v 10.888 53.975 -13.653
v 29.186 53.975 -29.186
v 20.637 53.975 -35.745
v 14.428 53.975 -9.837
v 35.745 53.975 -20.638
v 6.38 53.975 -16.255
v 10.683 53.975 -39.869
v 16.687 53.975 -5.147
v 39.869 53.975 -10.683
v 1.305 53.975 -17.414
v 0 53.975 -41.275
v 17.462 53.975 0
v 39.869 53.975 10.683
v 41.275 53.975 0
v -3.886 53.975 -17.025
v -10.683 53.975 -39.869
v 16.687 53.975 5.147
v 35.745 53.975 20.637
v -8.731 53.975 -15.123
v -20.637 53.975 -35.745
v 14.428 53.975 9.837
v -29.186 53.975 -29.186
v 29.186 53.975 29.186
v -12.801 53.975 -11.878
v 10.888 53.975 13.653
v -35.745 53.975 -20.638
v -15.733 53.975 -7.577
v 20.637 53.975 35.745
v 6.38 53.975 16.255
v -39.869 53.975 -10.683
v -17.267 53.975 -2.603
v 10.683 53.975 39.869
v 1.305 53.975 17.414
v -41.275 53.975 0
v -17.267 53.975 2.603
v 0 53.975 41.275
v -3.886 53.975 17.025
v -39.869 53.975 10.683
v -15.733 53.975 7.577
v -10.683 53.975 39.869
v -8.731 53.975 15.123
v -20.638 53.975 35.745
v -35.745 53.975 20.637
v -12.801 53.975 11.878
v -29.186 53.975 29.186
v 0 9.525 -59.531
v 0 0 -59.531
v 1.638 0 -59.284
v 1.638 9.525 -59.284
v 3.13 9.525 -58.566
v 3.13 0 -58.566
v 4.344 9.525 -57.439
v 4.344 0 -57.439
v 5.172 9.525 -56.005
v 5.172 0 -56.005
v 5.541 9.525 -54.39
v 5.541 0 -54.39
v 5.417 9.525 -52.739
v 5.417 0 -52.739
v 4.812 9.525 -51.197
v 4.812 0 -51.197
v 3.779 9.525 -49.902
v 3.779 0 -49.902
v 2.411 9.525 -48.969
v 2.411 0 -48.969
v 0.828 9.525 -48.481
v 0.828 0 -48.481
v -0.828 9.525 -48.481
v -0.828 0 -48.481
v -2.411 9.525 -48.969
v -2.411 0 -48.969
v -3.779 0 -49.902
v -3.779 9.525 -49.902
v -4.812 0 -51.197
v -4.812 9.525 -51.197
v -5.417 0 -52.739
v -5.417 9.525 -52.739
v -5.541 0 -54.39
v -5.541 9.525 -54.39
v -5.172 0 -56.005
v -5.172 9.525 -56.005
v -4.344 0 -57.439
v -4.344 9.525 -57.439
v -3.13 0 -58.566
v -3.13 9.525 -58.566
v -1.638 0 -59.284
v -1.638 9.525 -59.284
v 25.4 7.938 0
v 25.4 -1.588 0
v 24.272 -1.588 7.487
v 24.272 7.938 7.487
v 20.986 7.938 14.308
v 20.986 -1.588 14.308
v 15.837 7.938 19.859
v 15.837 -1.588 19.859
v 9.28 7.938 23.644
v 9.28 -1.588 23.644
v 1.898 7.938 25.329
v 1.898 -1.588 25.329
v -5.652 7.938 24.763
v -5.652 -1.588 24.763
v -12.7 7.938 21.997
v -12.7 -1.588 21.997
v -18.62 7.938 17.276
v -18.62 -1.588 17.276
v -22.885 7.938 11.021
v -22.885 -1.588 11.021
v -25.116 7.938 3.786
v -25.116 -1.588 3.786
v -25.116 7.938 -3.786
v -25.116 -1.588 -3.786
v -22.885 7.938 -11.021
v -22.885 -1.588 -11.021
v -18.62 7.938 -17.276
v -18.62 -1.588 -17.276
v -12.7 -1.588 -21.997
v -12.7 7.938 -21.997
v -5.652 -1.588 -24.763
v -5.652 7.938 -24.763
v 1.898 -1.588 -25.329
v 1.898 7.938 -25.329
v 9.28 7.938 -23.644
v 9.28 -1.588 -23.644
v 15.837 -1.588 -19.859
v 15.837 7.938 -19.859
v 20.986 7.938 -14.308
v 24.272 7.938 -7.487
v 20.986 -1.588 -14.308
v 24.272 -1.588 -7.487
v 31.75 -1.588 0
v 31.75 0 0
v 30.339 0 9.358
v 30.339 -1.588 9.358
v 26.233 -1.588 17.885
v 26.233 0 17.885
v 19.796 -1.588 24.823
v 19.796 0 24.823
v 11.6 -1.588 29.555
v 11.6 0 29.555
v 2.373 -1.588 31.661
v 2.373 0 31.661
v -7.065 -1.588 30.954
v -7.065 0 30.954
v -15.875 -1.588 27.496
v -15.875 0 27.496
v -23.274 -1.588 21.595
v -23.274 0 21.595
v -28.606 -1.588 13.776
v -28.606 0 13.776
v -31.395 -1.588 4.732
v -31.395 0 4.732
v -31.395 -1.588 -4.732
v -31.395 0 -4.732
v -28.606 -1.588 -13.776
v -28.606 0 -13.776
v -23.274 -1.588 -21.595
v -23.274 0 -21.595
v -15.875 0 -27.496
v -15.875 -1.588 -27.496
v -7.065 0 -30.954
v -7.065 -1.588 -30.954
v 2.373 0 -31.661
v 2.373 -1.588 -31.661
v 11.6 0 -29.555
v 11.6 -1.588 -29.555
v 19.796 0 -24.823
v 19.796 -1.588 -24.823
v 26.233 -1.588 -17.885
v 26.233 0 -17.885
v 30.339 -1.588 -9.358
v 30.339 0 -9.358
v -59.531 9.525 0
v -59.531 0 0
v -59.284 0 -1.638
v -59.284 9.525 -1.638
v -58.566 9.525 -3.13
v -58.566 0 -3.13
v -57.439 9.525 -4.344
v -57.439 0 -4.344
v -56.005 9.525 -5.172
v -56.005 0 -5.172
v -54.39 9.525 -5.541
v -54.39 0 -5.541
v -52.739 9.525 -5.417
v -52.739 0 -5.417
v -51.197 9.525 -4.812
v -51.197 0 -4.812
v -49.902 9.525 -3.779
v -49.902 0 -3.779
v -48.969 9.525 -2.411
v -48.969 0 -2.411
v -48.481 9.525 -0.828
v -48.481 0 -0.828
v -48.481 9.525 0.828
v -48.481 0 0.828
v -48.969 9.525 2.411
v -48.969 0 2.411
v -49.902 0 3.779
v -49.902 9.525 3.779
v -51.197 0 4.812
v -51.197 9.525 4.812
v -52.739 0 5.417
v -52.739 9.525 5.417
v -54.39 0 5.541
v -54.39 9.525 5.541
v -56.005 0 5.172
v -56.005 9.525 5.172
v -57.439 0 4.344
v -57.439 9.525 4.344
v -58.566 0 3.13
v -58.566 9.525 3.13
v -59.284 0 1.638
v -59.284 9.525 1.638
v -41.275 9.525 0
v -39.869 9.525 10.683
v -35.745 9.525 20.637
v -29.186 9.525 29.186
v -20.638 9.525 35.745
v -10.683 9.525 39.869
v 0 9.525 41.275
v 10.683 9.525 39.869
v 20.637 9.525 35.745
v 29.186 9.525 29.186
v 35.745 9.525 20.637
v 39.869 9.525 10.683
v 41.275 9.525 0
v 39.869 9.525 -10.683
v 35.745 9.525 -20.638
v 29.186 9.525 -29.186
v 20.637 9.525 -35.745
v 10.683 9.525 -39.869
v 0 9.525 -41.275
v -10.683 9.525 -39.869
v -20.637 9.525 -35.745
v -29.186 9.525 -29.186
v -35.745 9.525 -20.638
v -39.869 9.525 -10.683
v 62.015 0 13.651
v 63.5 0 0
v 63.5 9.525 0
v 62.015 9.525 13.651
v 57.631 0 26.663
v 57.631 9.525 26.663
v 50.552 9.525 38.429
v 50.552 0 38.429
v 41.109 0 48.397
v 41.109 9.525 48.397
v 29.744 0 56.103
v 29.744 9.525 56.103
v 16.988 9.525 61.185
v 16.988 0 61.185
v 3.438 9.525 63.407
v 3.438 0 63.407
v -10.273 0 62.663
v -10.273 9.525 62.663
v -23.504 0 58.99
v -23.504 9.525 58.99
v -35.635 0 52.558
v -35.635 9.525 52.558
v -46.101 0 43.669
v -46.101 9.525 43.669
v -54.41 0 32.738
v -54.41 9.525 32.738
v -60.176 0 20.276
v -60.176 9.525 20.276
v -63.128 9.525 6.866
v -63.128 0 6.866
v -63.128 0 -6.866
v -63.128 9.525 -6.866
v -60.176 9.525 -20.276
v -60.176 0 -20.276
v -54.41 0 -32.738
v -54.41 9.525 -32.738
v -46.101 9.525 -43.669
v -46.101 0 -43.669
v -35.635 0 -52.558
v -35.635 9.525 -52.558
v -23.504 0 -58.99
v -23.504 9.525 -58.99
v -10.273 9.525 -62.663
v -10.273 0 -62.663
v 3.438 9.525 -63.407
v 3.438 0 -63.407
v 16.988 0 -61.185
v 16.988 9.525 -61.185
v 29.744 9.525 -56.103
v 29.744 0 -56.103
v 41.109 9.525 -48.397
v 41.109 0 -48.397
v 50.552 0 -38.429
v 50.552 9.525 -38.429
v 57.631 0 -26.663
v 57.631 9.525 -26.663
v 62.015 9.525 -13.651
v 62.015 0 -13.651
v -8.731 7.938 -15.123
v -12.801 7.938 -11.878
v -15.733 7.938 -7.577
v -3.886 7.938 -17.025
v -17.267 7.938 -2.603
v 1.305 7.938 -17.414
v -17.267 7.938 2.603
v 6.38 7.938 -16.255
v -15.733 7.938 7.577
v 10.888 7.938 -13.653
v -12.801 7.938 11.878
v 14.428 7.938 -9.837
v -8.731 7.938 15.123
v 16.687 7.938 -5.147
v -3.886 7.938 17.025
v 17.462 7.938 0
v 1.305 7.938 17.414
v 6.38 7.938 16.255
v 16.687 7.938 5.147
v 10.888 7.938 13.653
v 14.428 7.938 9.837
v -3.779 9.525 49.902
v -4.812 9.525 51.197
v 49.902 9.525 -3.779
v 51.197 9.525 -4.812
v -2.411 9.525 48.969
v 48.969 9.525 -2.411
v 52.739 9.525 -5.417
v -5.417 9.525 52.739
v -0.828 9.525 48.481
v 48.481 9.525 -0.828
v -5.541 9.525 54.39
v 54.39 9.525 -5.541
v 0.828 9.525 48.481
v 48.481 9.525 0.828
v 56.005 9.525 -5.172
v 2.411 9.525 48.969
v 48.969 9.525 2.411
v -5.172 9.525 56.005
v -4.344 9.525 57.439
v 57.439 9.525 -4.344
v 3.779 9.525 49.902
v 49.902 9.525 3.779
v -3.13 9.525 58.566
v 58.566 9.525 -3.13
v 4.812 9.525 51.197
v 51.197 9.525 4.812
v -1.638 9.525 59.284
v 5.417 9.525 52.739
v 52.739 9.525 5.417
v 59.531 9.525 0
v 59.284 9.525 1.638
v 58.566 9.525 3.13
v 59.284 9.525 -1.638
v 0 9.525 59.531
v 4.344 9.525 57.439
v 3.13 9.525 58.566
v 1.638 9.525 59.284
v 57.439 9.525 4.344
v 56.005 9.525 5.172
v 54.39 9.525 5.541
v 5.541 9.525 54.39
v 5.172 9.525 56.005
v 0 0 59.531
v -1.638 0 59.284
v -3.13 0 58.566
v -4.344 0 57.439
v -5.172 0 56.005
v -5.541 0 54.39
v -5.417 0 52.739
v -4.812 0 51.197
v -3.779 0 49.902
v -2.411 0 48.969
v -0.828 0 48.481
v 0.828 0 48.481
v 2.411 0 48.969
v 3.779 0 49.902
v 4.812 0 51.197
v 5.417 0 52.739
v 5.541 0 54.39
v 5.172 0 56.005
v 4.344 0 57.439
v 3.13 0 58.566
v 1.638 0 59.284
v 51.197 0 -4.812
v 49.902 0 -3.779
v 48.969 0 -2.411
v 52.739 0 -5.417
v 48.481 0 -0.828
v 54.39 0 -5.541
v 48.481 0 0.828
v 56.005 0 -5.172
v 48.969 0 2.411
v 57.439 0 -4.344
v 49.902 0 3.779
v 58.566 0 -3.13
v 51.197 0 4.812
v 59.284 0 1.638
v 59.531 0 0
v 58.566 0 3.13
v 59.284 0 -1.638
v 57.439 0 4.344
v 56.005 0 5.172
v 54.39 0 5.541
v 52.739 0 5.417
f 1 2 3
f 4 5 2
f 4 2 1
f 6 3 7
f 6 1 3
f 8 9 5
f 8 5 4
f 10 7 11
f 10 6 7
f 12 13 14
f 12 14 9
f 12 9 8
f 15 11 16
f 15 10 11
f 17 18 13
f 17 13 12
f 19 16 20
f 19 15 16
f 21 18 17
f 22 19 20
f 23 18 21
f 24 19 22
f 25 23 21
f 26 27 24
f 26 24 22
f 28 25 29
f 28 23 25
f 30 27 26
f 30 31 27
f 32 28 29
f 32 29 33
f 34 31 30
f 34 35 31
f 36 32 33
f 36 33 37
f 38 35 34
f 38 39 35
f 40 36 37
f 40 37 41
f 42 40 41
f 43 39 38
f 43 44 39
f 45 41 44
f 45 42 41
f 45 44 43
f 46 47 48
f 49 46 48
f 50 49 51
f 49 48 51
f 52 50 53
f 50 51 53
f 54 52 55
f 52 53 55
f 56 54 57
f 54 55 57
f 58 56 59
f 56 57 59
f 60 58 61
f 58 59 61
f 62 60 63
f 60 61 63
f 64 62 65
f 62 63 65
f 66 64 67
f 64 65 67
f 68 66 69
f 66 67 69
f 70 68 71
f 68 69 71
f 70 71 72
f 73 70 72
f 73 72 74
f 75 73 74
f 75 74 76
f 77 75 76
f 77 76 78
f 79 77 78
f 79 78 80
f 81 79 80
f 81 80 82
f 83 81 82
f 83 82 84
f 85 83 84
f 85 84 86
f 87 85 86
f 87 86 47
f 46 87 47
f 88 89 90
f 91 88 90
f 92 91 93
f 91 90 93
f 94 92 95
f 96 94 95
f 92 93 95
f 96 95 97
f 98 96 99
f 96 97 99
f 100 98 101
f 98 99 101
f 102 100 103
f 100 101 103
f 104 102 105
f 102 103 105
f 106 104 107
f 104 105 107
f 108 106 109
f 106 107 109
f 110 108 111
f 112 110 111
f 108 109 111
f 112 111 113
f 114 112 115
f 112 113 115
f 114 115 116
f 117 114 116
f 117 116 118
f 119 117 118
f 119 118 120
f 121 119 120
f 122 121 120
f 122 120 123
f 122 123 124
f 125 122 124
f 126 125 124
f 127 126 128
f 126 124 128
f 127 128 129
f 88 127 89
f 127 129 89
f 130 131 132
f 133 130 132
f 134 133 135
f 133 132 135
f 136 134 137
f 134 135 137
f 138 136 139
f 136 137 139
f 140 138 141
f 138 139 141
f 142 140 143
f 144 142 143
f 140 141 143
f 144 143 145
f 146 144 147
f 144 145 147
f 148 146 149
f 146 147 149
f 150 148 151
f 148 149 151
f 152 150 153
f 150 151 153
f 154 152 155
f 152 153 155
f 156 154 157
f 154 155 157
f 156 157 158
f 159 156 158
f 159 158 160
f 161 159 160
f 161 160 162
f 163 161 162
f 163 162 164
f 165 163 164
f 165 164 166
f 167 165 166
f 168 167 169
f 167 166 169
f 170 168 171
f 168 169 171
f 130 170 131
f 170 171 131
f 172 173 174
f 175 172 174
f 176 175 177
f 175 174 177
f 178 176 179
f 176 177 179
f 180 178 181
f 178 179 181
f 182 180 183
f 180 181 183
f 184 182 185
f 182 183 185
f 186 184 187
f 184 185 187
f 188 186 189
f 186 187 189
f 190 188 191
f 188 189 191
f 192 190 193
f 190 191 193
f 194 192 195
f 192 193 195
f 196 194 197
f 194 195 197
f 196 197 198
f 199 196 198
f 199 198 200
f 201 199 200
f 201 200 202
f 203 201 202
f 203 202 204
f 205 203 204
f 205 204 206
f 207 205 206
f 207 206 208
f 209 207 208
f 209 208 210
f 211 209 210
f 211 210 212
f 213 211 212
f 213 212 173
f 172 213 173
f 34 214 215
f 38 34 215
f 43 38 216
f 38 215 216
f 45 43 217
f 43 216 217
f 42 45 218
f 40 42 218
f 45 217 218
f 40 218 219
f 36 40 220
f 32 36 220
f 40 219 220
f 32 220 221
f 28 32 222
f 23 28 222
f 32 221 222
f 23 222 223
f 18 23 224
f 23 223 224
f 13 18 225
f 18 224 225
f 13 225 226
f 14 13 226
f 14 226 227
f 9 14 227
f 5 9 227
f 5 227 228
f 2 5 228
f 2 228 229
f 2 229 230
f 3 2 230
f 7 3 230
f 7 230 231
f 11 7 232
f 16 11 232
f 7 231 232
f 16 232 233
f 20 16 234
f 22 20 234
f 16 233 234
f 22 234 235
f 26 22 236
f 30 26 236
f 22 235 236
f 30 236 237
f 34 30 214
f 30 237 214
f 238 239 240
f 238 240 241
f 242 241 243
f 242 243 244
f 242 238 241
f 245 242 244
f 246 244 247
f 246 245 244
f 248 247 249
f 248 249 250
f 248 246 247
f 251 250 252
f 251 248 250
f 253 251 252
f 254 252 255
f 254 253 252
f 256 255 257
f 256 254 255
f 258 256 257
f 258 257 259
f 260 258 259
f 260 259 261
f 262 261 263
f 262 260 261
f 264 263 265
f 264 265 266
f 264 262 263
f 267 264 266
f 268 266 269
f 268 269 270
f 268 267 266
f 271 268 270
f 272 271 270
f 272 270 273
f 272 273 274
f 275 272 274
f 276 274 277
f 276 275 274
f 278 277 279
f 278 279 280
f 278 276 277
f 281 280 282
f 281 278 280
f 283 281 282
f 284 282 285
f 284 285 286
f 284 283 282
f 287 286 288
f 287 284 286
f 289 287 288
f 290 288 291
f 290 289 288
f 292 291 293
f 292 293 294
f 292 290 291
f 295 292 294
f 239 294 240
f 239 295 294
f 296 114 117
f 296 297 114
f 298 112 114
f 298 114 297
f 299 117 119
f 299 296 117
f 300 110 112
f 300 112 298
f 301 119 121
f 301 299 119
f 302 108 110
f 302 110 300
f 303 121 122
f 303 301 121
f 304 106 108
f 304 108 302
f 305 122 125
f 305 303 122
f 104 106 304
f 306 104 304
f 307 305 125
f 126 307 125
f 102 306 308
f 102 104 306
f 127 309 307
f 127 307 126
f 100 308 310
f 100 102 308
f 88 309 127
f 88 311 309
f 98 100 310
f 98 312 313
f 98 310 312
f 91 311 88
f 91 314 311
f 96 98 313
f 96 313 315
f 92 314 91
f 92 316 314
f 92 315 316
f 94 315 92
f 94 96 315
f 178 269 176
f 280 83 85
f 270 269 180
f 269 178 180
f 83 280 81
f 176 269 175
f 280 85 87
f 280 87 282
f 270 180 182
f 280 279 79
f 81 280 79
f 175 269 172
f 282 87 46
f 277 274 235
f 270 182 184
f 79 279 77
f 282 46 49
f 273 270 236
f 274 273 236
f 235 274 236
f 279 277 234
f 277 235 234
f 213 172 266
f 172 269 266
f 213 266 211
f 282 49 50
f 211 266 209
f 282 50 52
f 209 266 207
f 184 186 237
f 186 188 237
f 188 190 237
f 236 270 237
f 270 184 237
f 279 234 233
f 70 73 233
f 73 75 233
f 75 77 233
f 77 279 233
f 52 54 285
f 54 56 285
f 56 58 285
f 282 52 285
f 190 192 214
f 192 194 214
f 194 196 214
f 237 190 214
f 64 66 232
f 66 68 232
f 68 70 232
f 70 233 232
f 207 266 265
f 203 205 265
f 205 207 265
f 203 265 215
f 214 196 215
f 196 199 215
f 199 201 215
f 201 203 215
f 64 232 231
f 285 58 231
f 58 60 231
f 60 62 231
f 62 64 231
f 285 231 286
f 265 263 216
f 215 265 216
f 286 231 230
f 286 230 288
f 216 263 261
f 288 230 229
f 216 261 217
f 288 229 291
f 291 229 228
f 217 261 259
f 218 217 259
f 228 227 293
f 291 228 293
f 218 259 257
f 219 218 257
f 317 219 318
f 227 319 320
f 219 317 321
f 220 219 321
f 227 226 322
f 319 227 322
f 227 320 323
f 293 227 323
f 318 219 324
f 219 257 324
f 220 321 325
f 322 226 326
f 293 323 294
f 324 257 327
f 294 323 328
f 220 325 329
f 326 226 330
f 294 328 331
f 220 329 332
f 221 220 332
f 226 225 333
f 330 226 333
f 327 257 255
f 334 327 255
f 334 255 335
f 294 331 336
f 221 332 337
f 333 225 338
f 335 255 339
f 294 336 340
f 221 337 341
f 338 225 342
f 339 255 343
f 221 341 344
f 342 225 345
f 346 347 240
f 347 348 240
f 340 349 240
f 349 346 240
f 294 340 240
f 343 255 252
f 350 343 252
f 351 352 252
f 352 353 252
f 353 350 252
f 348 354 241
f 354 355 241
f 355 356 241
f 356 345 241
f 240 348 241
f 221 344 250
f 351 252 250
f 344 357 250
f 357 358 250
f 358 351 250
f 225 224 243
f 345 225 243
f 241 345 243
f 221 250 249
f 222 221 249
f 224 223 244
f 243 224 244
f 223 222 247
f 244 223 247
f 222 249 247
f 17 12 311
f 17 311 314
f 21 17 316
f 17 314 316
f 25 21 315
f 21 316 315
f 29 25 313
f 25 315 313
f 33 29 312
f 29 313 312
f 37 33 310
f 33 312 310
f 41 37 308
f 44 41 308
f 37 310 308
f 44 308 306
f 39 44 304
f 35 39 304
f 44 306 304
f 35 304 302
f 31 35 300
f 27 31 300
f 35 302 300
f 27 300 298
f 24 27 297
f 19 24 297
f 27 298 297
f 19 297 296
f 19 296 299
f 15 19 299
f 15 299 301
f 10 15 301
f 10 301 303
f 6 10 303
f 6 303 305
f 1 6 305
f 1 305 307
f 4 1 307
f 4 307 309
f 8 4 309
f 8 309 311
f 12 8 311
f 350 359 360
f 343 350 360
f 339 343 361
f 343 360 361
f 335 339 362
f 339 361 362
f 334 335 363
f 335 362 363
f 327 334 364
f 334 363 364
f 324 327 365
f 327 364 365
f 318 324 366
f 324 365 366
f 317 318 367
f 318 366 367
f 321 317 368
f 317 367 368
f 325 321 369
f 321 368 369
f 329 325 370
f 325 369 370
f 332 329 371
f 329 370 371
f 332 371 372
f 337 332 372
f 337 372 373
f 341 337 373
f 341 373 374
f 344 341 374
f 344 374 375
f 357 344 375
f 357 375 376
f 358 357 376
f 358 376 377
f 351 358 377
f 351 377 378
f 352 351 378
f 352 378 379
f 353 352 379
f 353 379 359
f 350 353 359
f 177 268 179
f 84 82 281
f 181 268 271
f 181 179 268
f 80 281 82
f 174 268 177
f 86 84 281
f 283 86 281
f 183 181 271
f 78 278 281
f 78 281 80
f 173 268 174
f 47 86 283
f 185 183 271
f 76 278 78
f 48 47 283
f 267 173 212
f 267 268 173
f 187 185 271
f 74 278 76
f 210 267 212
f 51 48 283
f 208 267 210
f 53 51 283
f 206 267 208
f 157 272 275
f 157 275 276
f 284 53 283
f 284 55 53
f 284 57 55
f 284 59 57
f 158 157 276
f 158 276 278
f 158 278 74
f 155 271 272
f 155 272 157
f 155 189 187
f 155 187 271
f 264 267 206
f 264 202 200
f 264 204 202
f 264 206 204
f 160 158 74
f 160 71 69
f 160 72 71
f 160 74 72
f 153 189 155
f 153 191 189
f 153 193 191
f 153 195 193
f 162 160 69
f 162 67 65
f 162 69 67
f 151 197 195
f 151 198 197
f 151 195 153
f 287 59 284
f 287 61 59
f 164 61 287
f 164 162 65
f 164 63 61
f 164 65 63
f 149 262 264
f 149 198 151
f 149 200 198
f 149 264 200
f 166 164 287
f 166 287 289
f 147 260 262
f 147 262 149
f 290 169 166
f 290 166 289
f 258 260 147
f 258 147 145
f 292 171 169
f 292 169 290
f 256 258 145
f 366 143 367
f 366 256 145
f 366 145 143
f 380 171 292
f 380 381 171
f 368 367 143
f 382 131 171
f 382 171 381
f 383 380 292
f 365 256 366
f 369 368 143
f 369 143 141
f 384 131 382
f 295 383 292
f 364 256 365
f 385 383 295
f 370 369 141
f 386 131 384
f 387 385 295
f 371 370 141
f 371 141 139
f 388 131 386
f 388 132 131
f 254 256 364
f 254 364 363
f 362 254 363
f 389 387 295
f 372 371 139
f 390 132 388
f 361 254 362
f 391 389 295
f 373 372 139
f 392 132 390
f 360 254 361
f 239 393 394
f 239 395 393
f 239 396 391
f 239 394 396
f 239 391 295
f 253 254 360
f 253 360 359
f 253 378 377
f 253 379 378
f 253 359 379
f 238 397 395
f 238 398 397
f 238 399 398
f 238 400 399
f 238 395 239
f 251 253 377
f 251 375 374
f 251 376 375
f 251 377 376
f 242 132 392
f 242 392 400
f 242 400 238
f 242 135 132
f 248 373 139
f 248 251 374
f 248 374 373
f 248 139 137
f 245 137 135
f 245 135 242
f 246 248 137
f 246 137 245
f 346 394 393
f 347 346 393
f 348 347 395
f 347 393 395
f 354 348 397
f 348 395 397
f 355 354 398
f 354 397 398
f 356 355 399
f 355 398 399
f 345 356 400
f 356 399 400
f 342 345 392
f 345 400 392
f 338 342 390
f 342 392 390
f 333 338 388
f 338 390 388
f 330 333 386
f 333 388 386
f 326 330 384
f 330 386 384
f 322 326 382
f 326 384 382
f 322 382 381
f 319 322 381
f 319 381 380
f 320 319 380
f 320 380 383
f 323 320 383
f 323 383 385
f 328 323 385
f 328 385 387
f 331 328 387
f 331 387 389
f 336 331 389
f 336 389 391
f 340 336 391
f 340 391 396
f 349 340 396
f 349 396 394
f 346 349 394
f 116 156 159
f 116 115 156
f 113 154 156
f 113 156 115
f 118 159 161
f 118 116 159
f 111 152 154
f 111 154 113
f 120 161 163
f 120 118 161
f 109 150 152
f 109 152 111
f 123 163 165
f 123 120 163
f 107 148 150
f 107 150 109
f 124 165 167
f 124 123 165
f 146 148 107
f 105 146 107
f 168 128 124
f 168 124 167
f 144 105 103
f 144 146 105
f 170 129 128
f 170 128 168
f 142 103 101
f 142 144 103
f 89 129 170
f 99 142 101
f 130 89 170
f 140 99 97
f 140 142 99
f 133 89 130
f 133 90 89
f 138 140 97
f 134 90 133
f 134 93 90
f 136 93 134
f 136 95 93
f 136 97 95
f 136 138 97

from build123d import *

# Parameters (mm, degrees)
F0_R             = 63.5
F1_DEPTH         = 9.525
F2_R             = 31.75
F3_DEPTH         = 1.5875
F4_R             = 25.4
F5_DEPTH         = 9.525
F6_R             = 41.275
F7_DEPTH         = 44.45
F8_R             = 17.4625
F9_DEPTH         = 55.5635
F10_R            = 5.55625
F11_DEPTH        = 53.976
F11_COPIES_COUNT = 4


# Not quite as in the source:
# - a pattern or mirror of a feature is missing from the dataset's text; its kind, count and spacing are read off the source's solid


with BuildPart() as f1:
    # F0 (on Front) → F1 (new body)
    with BuildSketch(Plane.XZ):
        Circle(F0_R)
    extrude(amount=-F1_DEPTH)

    # F2 (on face) → F3 (join)
    with BuildSketch(Plane.XZ):
        Circle(F2_R)
    extrude(amount=F3_DEPTH)

    # F4 (on face) → F5 (cut)
    with BuildSketch(Plane.XZ.offset(1.5875)):
        Circle(F4_R)
    extrude(amount=-F5_DEPTH, mode=Mode.SUBTRACT)

    # F6 (on face) → F7 (join)
    with BuildSketch(Plane(origin=(0, 9.525, 0), x_dir=(-1, 0, 0), z_dir=(0, 1, 0))):
        Circle(F6_R)
    extrude(amount=F7_DEPTH)

    # F8 (on face) → F9 (cut, through all)
    with BuildSketch(Plane.XZ.offset(1.5875)):
        Circle(F8_R)
    extrude(amount=-F9_DEPTH, mode=Mode.SUBTRACT)

    # F10 (on face) → F11 (cut, through all)
    with BuildSketch(Plane.XZ):
        with Locations((53.975, 0)):
            Circle(F10_R)
    f11 = extrude(amount=-F11_DEPTH, mode=Mode.SUBTRACT)

    # F11_copies: F11 ×4 about axis
    f11_copies_axis = Axis((0, 0, 0), (0, 1, 0))
    for i in range(1, F11_COPIES_COUNT):
        add(f11.rotate(f11_copies_axis, i * 360 / F11_COPIES_COUNT), mode=Mode.SUBTRACT)


solid = f1.part
